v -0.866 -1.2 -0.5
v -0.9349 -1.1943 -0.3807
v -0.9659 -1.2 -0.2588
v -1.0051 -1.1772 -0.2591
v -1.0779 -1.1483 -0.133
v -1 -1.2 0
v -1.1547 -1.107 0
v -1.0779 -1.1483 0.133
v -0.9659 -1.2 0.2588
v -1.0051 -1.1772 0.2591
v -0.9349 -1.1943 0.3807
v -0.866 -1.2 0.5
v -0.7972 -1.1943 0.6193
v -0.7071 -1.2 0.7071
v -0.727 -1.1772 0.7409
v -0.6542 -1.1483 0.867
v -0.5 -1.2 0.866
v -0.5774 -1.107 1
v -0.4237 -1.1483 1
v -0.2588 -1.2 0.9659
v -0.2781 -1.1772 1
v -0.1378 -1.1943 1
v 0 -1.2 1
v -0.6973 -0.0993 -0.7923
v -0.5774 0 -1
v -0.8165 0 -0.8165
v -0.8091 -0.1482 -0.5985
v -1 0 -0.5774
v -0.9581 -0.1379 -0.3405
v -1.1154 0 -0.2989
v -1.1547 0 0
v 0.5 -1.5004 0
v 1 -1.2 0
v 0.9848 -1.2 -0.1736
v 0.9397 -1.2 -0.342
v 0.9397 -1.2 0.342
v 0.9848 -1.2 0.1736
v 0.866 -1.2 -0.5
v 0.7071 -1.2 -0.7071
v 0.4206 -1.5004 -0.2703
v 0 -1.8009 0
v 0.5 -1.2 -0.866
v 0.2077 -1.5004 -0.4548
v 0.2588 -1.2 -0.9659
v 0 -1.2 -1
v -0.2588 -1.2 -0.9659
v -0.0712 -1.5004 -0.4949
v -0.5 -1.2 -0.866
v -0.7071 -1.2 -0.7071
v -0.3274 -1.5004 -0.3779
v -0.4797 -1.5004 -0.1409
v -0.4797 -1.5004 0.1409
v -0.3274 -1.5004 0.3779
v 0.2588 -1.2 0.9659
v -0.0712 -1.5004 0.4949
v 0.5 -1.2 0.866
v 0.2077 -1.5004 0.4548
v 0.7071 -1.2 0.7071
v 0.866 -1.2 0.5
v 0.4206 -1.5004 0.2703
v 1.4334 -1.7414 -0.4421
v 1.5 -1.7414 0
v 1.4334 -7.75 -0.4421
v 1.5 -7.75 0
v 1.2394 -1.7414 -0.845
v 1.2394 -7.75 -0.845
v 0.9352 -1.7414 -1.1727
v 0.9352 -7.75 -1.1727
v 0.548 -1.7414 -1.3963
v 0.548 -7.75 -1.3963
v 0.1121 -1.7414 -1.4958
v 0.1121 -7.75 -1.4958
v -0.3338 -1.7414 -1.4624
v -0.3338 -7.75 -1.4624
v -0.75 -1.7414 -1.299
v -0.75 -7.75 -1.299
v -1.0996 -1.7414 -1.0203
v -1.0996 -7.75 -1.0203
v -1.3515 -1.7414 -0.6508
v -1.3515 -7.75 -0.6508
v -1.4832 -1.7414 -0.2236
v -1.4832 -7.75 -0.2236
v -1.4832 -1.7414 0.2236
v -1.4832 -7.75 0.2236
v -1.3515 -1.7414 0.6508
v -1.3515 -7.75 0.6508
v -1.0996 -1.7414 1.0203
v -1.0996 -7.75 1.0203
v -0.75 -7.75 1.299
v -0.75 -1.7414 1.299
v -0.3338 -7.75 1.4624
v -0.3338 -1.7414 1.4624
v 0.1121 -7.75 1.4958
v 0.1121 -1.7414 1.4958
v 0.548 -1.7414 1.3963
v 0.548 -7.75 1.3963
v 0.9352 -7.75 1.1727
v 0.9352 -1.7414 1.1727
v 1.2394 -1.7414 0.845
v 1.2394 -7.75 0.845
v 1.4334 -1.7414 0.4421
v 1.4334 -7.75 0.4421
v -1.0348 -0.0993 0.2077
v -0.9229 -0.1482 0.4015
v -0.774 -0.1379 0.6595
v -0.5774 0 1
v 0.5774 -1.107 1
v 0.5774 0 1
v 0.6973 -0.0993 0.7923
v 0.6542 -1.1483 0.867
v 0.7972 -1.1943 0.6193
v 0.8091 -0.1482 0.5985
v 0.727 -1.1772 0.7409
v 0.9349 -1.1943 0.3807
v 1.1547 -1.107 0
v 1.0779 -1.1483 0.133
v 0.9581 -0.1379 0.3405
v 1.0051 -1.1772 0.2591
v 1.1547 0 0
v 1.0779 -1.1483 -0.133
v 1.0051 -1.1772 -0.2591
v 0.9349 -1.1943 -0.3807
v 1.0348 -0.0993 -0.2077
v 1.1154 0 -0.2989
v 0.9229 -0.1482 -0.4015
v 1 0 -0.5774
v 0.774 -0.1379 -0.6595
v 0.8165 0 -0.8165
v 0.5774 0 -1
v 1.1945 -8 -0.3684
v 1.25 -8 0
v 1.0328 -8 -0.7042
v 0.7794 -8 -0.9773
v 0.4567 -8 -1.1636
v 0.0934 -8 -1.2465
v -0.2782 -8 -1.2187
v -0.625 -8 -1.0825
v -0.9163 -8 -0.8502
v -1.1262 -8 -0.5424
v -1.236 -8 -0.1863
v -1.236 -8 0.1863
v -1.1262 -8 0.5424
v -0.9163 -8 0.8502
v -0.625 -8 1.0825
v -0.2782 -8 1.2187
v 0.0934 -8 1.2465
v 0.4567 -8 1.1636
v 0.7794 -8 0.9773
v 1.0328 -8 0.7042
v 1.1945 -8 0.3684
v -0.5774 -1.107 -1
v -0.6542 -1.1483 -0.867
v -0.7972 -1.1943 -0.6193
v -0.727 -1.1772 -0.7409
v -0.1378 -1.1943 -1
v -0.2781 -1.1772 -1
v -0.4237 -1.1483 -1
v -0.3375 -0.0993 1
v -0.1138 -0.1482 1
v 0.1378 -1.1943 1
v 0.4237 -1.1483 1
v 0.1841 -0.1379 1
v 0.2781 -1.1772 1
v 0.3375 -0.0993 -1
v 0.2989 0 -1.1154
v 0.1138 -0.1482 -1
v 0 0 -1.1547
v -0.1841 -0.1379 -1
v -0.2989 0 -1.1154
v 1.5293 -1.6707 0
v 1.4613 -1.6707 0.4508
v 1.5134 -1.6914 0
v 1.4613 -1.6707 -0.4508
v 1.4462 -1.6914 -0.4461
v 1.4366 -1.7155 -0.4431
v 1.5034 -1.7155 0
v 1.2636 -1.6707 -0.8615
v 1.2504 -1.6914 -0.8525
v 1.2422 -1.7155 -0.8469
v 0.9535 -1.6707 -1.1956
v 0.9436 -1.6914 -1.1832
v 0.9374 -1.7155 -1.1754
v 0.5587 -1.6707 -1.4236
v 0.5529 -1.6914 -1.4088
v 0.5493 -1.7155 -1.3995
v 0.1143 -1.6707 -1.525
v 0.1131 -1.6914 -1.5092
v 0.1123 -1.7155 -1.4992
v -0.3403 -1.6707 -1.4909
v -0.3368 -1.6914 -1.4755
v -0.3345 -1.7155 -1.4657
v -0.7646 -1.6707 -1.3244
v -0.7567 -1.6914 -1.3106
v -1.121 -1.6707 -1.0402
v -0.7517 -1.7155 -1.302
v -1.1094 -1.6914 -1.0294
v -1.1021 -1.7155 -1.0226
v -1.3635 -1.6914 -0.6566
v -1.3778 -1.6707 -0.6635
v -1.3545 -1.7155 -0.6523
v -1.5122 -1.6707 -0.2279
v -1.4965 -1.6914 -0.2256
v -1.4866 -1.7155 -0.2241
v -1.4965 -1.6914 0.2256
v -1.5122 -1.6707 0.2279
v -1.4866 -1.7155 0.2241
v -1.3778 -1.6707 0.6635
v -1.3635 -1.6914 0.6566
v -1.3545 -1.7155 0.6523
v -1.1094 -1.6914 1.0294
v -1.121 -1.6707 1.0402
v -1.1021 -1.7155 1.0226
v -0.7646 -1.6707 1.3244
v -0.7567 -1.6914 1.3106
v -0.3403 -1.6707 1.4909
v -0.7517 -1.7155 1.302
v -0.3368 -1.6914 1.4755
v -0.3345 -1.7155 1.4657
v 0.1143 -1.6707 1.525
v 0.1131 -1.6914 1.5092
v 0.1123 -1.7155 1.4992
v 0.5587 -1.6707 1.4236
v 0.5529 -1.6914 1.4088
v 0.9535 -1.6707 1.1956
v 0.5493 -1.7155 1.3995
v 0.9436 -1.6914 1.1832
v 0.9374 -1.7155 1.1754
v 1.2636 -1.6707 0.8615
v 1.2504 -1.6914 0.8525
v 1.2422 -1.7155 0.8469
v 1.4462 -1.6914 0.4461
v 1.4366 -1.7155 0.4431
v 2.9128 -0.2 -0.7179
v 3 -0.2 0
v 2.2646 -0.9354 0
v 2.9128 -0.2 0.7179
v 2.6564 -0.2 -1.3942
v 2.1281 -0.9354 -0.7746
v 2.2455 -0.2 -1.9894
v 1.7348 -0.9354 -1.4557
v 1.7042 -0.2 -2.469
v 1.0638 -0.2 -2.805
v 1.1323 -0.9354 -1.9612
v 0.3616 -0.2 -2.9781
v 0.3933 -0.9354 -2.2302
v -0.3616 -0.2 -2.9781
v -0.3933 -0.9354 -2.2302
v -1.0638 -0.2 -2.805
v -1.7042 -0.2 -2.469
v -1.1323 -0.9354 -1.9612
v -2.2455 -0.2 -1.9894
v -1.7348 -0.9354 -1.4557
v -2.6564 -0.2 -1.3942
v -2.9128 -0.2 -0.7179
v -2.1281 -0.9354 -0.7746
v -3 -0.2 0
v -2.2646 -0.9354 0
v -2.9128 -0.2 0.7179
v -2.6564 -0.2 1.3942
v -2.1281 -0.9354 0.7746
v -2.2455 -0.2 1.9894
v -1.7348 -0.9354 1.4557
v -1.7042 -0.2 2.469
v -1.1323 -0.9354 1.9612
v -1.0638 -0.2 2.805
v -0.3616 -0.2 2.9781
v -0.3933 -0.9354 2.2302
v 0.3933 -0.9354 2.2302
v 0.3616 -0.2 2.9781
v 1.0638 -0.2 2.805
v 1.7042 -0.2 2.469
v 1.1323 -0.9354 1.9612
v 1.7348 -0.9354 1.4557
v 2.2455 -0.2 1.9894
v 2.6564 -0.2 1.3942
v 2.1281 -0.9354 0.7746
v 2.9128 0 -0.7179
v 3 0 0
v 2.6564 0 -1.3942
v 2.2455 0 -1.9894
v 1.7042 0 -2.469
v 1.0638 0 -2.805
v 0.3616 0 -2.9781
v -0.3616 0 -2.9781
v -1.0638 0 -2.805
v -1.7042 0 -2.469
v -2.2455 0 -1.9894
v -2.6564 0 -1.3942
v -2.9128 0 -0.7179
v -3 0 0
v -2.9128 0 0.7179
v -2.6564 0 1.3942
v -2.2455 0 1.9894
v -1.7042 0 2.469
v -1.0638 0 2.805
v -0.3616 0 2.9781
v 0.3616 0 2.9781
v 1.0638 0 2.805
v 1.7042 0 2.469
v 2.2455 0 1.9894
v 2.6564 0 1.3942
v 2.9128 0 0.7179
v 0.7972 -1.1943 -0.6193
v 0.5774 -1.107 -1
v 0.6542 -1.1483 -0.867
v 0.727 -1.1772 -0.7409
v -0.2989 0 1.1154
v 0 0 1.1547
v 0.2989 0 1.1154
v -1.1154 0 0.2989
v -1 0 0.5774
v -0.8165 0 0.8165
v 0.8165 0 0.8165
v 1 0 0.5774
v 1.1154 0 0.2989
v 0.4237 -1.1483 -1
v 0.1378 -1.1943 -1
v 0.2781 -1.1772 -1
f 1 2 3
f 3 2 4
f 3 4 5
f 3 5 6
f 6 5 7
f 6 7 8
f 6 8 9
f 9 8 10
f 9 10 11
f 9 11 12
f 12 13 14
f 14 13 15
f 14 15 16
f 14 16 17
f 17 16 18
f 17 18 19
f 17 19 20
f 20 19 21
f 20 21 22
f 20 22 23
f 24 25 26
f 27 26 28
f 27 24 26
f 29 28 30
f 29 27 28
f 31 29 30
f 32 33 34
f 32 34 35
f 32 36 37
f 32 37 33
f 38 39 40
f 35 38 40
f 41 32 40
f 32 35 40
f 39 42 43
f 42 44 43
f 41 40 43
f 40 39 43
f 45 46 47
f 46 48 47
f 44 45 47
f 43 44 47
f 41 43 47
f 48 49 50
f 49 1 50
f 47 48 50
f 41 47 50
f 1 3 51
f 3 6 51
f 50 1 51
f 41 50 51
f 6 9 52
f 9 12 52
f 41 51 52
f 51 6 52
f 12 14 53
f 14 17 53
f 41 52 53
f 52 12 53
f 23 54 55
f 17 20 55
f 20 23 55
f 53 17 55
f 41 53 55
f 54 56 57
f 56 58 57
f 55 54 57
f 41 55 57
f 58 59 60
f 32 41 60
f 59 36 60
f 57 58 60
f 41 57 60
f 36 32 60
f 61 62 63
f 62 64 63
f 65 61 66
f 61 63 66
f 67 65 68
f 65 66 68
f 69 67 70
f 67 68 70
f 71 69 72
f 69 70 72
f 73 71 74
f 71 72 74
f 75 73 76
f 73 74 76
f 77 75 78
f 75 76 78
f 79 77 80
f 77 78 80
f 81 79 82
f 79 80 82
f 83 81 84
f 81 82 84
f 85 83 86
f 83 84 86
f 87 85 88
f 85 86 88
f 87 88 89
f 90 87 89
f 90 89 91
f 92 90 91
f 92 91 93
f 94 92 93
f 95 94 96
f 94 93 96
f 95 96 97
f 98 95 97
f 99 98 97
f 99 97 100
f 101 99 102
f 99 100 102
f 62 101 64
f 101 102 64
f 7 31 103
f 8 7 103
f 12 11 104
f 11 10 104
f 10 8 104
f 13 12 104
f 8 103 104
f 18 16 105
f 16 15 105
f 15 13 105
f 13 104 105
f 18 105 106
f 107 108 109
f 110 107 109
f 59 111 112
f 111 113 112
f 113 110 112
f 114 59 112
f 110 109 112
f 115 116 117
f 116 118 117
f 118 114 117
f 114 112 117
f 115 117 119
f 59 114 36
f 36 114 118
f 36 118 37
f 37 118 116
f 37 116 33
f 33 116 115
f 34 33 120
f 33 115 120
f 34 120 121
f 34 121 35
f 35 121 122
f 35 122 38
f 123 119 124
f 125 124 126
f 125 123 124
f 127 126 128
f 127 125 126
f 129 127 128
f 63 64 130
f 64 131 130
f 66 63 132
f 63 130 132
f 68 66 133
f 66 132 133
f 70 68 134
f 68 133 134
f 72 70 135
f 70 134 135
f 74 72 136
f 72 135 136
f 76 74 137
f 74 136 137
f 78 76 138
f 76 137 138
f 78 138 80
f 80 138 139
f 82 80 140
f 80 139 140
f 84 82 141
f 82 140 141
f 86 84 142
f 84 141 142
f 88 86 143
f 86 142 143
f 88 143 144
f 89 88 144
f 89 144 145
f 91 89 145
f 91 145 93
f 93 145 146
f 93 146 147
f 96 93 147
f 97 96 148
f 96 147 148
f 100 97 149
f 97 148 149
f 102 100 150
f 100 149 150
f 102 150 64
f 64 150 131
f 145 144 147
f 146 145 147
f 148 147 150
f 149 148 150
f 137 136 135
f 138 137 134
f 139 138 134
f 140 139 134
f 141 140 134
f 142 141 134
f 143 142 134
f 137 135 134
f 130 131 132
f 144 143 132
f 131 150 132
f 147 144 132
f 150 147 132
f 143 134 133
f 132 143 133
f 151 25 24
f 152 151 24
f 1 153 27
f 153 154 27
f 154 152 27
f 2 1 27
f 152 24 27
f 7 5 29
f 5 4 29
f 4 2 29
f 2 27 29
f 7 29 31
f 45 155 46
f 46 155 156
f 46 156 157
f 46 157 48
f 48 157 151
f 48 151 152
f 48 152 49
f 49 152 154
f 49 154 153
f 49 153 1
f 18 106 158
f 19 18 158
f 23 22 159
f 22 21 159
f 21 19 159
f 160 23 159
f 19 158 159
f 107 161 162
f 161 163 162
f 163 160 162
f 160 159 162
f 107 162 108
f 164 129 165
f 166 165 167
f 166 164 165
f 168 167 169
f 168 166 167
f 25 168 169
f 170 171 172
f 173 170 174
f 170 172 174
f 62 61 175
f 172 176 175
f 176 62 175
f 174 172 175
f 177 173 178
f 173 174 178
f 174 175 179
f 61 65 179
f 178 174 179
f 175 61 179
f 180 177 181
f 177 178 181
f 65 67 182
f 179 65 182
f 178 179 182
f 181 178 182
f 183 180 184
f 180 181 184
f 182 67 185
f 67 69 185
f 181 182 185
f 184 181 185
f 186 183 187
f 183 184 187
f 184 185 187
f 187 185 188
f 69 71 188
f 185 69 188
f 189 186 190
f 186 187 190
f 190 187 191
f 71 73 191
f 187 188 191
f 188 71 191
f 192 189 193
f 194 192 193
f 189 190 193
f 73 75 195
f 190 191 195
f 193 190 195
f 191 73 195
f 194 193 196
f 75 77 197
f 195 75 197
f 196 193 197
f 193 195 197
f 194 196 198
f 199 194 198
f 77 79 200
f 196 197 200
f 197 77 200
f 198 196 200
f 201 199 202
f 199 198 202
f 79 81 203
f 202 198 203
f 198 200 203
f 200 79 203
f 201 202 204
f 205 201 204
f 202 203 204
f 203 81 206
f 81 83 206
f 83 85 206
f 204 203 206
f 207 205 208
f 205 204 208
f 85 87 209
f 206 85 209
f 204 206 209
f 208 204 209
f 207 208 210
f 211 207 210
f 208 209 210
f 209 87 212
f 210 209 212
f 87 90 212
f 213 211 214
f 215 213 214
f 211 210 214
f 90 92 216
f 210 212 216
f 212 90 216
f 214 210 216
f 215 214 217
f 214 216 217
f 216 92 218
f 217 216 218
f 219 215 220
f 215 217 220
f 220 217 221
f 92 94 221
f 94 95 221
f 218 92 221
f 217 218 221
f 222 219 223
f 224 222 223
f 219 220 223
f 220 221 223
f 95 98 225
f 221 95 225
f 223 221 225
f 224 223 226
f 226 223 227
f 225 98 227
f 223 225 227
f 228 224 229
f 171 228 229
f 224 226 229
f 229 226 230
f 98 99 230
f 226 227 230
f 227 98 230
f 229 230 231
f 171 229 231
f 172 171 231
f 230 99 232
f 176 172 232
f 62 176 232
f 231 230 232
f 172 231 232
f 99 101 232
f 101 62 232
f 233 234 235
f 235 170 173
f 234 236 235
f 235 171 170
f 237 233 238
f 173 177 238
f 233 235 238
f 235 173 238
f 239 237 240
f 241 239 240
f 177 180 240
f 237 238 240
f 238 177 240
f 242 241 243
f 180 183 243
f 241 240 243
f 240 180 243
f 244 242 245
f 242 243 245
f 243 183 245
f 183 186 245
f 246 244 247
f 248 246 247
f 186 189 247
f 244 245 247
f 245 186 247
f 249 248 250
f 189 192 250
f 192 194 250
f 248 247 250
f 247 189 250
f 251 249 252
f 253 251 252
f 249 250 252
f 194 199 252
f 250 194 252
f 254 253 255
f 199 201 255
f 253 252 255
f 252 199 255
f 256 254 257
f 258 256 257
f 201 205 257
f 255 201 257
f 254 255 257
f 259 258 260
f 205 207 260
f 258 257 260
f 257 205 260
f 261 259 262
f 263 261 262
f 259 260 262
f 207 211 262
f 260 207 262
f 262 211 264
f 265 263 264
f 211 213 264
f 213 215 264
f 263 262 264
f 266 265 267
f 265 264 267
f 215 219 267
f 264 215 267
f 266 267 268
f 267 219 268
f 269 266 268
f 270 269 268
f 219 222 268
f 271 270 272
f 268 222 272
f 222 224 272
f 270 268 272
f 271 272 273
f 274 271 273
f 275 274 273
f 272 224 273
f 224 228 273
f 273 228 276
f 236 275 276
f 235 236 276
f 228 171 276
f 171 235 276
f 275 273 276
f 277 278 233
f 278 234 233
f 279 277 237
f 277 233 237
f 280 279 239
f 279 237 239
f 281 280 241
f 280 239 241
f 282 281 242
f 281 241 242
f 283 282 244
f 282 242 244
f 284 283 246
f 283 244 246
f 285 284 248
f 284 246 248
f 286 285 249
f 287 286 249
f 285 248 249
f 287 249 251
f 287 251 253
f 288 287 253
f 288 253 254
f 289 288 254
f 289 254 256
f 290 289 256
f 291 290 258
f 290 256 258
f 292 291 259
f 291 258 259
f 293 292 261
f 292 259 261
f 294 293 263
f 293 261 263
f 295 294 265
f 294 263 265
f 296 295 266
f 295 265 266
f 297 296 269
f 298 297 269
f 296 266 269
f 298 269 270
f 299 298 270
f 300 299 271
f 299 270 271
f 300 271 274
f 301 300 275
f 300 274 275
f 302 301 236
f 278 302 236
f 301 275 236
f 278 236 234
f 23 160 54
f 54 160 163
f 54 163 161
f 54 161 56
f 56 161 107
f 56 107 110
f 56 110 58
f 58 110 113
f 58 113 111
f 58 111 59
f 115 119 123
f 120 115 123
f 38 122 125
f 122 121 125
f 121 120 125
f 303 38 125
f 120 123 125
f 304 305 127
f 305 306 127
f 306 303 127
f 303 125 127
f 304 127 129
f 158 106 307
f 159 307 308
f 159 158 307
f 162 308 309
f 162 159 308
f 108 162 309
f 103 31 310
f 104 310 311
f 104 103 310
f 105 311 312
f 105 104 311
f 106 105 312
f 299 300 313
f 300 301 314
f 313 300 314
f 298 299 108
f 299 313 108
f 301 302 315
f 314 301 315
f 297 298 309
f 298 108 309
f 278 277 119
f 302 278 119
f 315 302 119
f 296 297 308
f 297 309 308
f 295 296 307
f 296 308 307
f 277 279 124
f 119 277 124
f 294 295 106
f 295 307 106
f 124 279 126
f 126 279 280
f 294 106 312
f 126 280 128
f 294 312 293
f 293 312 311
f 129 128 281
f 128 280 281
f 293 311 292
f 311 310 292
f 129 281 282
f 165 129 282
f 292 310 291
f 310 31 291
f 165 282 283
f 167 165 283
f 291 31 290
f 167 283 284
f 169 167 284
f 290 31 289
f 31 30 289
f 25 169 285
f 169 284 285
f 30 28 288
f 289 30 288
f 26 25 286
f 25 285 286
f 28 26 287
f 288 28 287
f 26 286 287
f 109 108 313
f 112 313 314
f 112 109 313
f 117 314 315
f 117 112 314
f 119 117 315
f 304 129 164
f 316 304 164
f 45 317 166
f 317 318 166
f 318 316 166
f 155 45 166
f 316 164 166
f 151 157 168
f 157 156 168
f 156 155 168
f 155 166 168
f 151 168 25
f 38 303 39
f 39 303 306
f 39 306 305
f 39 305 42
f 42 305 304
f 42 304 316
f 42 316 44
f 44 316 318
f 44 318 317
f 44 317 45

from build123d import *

# Parameters (mm, degrees)
CORTE_EXTRUS_O1_REACH = 11.055


with BuildPart() as part:
    # Esboço1 → Revolução1 (revolve)
    with BuildSketch(Plane.XY):
        with BuildLine():
            Line((0, -1.800860619), (1, -1.2))
            Line((1, -1.2), (1, 0))
            Line((1, 0), (3, 0))
            Line((3, 0), (3, -0.2))
            Line((3, -0.2), (1.529289322, -1.670710678))
            ThreePointArc((1.529289322, -1.670710678), (1.507612047, -1.703153013), (1.5, -1.741421356))
            Line((1.5, -1.741421356), (1.5, -7.75))
            Line((1.5, -7.75), (1.25, -8))
            Line((1.25, -8), (0, -8))
            Line((0, -8), (0, -1.800860619))
        make_face()
    revolve(axis=Axis((0, -1000, 0), (0, 1, 0)))

    # Corte-extrusão1: up to this cone (the profile starts inside it)
    corte_extrus_o1_end = Plane(origin=(0, 0, 0), z_dir=(0, 1, 0)).offset(-1.800859619) * Cone(1.664e-06, 27.215955714, 16.352994998, align=(Align.CENTER, Align.CENTER, Align.MIN), mode=Mode.PRIVATE)
    # Esboço2 → Corte-extrusão1 (cut, up to the surface)
    with BuildSketch(Plane(origin=(0, 0, 0), x_dir=(1, 0, 0), z_dir=(0, 1, 0)), mode=Mode.PRIVATE) as corte_extrus_o1_sk1:
        Polygon((-1.154700538, 0), (-0.577350269, -1), (0.577350269, -1), (1.154700538, 0), (0.577350269, 1), (-0.577350269, 1), align=None)
    corte_extrus_o1_tool1 = extrude(corte_extrus_o1_sk1.sketch, amount=-CORTE_EXTRUS_O1_REACH, mode=Mode.PRIVATE) & corte_extrus_o1_end
    add(corte_extrus_o1_tool1.solids().sort_by_distance((0, 0, 0))[0], mode=Mode.SUBTRACT)

    # Esboço3 → Corte-Revolução1 (revolve, cut)
    with BuildSketch(Plane.XY, mode=Mode.PRIVATE) as corte_revolu_o1_sk:
        Polygon((1.154700538, 0), (0, -1.154700538), (0, 0), align=None)
    revolve(corte_revolu_o1_sk.sketch.rotate(Axis((0, -1000, 0), (0, 1, 0)), 180), axis=Axis((0, -1000, 0), (0, 1, 0)), mode=Mode.SUBTRACT)


solid = part.part
